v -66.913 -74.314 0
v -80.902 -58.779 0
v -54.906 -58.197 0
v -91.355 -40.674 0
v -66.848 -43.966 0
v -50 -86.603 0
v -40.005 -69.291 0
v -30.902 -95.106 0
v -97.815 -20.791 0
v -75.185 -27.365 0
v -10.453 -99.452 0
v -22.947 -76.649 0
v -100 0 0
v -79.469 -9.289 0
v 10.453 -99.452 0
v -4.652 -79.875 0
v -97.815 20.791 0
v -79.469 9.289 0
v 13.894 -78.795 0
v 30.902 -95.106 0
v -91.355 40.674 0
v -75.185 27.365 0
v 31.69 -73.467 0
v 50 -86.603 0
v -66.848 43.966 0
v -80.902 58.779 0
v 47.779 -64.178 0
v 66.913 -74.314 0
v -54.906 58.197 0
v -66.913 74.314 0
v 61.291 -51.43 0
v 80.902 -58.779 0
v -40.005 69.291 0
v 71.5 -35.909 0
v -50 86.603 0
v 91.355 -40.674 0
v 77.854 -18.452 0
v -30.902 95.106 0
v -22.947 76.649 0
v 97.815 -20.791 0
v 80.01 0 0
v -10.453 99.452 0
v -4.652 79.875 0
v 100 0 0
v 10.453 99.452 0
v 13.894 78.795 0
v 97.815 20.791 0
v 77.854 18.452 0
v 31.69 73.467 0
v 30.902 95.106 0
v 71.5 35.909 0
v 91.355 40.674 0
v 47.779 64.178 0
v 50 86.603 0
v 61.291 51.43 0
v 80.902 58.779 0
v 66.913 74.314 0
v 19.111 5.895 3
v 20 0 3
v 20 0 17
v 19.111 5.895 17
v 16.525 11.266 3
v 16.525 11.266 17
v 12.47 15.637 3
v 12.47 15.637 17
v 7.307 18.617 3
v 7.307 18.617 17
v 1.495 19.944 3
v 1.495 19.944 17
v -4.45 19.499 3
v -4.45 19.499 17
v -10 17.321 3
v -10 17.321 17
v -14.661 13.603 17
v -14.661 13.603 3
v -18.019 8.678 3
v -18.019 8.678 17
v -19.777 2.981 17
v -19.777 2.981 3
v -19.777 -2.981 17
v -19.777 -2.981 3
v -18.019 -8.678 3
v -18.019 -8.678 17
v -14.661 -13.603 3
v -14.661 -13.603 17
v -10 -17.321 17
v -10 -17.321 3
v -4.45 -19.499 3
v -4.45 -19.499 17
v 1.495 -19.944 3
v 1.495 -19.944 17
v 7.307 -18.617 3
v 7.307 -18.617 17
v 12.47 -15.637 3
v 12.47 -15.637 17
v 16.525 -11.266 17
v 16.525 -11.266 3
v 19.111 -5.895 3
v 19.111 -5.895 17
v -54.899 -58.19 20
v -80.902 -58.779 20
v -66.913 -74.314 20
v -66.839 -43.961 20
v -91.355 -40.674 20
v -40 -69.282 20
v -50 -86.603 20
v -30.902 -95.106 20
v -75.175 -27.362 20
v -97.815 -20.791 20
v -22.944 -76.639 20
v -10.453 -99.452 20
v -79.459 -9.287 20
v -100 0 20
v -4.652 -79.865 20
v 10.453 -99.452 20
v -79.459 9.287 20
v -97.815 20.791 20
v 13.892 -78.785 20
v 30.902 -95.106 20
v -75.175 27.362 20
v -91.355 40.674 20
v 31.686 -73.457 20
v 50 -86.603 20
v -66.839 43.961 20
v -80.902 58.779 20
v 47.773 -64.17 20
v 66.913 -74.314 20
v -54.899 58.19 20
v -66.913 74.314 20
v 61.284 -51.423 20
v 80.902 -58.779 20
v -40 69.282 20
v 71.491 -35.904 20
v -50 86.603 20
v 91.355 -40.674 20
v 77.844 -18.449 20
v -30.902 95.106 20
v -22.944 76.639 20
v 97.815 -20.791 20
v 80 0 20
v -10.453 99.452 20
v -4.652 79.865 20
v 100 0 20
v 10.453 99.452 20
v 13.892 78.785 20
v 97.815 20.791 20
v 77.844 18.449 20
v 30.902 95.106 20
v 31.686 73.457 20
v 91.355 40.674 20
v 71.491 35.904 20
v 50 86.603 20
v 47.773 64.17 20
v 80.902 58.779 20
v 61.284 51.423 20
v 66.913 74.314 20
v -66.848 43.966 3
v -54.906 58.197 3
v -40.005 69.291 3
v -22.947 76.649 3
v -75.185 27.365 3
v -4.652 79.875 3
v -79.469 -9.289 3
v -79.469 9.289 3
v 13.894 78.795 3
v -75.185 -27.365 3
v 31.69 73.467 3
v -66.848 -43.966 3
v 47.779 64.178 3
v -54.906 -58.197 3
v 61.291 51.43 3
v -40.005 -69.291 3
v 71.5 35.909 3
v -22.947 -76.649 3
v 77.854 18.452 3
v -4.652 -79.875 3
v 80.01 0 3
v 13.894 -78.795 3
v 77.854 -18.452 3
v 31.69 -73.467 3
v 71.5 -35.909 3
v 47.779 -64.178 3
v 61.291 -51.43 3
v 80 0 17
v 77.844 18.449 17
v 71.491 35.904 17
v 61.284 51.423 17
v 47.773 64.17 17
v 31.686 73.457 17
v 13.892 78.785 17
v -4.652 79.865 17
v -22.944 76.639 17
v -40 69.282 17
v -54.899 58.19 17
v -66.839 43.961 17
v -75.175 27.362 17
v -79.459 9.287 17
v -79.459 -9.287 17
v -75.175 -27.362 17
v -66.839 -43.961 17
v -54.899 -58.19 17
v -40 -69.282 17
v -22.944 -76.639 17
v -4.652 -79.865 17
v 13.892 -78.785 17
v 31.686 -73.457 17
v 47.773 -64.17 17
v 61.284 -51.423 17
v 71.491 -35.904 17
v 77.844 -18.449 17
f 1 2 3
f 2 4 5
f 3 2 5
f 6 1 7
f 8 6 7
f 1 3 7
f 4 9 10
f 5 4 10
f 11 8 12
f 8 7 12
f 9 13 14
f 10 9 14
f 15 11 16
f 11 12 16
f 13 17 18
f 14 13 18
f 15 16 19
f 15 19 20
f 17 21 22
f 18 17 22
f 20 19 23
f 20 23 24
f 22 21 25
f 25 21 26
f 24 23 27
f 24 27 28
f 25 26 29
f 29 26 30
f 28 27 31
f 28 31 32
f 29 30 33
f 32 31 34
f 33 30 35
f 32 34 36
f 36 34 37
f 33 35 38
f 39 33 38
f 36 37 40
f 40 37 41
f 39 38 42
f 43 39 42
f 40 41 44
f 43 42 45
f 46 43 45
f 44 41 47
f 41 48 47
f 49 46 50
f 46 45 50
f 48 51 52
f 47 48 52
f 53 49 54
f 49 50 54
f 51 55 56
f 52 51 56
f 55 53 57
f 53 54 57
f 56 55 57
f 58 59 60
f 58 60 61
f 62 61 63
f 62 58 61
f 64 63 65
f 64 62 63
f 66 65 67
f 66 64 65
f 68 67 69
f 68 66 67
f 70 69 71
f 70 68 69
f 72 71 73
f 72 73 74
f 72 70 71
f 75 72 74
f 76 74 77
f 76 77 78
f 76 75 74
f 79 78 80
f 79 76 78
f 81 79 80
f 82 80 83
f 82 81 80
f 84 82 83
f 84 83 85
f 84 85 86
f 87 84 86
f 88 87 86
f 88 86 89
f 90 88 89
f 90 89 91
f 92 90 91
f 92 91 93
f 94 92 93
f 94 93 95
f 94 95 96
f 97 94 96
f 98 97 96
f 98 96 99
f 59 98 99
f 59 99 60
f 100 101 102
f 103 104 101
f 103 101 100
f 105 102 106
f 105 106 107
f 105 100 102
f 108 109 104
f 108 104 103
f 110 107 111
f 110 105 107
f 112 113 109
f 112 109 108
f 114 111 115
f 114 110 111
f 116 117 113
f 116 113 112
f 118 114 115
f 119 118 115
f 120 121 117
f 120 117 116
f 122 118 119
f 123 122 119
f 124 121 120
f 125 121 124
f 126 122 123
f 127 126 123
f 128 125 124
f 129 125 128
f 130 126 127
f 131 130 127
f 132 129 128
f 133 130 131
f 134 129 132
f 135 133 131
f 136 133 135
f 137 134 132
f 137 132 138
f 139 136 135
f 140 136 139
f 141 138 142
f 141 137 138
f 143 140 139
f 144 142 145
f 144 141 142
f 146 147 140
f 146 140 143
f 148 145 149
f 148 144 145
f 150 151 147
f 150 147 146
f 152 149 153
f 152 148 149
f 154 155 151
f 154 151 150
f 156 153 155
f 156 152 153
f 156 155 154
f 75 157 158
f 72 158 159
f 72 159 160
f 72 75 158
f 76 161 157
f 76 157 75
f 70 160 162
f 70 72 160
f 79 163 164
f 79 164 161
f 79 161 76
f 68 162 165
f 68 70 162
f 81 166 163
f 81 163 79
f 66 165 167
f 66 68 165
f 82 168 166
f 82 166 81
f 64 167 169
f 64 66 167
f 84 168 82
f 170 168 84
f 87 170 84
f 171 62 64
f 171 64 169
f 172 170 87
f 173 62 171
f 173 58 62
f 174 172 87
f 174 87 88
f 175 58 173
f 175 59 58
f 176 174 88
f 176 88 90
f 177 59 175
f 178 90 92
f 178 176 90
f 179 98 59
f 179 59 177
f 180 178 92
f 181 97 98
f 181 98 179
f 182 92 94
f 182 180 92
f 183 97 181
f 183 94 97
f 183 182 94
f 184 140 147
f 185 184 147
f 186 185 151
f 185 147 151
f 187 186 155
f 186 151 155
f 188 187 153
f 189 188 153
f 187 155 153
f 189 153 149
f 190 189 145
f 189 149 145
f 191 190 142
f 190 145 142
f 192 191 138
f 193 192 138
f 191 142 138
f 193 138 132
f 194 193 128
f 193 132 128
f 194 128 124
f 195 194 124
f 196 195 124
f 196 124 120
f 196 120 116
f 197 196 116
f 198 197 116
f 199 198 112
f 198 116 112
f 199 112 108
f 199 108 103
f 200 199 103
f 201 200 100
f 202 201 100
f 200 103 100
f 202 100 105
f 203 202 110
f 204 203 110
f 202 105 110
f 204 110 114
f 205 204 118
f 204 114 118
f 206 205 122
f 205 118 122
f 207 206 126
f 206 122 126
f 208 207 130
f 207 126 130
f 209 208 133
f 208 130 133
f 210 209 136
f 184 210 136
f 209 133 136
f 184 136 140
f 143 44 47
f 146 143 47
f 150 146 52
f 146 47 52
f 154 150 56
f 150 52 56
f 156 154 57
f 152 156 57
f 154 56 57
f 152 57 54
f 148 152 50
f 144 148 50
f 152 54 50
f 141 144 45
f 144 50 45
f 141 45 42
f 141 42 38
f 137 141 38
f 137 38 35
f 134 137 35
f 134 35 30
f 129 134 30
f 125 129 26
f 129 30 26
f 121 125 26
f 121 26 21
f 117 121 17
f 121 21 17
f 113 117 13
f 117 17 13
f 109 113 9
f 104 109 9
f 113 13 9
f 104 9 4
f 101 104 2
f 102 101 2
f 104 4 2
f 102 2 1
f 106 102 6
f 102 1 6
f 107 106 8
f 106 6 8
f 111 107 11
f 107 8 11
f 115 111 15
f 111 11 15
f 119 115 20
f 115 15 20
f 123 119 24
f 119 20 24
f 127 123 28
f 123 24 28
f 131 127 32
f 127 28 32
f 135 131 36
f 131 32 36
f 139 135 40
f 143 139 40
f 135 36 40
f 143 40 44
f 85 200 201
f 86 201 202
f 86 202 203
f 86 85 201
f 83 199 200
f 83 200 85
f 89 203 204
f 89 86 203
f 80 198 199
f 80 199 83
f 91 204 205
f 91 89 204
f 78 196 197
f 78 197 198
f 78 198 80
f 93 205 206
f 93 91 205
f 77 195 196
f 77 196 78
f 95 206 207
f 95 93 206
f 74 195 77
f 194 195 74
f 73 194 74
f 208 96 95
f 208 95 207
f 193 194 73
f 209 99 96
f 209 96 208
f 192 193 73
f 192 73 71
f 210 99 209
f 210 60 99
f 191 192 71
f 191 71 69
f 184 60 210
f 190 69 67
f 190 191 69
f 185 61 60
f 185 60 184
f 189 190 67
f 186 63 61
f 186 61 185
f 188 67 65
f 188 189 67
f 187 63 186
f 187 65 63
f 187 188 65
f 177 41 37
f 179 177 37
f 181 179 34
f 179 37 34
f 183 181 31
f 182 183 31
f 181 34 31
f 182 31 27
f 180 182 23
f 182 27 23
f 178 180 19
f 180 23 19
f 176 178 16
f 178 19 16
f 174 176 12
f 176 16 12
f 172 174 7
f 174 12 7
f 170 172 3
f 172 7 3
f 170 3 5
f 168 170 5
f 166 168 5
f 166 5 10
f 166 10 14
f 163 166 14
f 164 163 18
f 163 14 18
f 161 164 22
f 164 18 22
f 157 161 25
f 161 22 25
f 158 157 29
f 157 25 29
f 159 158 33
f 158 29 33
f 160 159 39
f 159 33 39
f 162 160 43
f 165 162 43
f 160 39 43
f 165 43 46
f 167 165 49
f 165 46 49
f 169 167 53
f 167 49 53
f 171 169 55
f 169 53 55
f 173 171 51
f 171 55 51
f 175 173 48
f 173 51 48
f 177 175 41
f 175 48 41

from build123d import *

# Parameters (mm, degrees)
F0_R     = 100
F0_R_2   = 95
F0_R_3   = 80
F0_R_4   = 20
F1_DEPTH = 20
F2_R     = 80
F2_R_2   = 20
F3_DEPTH = 3
F4_R     = 80.0102
F4_R_2   = 20
F5_DEPTH = 3


with BuildPart() as f1:
    # F0 (on Top) → F1 (new body)
    with BuildSketch(Plane.XY):
        Circle(F0_R)
        Circle(F0_R_2, mode=Mode.SUBTRACT)
        Circle(F0_R_2)
        Circle(F0_R_3, mode=Mode.SUBTRACT)
        Circle(F0_R_3)
        Circle(F0_R_4, mode=Mode.SUBTRACT)
    extrude(amount=F1_DEPTH)

    # F2 (on face) → F3 (cut)
    with BuildSketch(Plane.XY.offset(20)):
        Circle(F2_R)
        Circle(F2_R_2, mode=Mode.SUBTRACT)
    extrude(amount=-F3_DEPTH, mode=Mode.SUBTRACT)

    # F4 (on face) → F5 (cut)
    with BuildSketch(Plane(origin=(0, 0, 0), x_dir=(1, 0, 0), z_dir=(0, 0, -1))):
        Circle(F4_R)
        Circle(F4_R_2, mode=Mode.SUBTRACT)
    extrude(amount=-F5_DEPTH, mode=Mode.SUBTRACT)


solid = f1.part
